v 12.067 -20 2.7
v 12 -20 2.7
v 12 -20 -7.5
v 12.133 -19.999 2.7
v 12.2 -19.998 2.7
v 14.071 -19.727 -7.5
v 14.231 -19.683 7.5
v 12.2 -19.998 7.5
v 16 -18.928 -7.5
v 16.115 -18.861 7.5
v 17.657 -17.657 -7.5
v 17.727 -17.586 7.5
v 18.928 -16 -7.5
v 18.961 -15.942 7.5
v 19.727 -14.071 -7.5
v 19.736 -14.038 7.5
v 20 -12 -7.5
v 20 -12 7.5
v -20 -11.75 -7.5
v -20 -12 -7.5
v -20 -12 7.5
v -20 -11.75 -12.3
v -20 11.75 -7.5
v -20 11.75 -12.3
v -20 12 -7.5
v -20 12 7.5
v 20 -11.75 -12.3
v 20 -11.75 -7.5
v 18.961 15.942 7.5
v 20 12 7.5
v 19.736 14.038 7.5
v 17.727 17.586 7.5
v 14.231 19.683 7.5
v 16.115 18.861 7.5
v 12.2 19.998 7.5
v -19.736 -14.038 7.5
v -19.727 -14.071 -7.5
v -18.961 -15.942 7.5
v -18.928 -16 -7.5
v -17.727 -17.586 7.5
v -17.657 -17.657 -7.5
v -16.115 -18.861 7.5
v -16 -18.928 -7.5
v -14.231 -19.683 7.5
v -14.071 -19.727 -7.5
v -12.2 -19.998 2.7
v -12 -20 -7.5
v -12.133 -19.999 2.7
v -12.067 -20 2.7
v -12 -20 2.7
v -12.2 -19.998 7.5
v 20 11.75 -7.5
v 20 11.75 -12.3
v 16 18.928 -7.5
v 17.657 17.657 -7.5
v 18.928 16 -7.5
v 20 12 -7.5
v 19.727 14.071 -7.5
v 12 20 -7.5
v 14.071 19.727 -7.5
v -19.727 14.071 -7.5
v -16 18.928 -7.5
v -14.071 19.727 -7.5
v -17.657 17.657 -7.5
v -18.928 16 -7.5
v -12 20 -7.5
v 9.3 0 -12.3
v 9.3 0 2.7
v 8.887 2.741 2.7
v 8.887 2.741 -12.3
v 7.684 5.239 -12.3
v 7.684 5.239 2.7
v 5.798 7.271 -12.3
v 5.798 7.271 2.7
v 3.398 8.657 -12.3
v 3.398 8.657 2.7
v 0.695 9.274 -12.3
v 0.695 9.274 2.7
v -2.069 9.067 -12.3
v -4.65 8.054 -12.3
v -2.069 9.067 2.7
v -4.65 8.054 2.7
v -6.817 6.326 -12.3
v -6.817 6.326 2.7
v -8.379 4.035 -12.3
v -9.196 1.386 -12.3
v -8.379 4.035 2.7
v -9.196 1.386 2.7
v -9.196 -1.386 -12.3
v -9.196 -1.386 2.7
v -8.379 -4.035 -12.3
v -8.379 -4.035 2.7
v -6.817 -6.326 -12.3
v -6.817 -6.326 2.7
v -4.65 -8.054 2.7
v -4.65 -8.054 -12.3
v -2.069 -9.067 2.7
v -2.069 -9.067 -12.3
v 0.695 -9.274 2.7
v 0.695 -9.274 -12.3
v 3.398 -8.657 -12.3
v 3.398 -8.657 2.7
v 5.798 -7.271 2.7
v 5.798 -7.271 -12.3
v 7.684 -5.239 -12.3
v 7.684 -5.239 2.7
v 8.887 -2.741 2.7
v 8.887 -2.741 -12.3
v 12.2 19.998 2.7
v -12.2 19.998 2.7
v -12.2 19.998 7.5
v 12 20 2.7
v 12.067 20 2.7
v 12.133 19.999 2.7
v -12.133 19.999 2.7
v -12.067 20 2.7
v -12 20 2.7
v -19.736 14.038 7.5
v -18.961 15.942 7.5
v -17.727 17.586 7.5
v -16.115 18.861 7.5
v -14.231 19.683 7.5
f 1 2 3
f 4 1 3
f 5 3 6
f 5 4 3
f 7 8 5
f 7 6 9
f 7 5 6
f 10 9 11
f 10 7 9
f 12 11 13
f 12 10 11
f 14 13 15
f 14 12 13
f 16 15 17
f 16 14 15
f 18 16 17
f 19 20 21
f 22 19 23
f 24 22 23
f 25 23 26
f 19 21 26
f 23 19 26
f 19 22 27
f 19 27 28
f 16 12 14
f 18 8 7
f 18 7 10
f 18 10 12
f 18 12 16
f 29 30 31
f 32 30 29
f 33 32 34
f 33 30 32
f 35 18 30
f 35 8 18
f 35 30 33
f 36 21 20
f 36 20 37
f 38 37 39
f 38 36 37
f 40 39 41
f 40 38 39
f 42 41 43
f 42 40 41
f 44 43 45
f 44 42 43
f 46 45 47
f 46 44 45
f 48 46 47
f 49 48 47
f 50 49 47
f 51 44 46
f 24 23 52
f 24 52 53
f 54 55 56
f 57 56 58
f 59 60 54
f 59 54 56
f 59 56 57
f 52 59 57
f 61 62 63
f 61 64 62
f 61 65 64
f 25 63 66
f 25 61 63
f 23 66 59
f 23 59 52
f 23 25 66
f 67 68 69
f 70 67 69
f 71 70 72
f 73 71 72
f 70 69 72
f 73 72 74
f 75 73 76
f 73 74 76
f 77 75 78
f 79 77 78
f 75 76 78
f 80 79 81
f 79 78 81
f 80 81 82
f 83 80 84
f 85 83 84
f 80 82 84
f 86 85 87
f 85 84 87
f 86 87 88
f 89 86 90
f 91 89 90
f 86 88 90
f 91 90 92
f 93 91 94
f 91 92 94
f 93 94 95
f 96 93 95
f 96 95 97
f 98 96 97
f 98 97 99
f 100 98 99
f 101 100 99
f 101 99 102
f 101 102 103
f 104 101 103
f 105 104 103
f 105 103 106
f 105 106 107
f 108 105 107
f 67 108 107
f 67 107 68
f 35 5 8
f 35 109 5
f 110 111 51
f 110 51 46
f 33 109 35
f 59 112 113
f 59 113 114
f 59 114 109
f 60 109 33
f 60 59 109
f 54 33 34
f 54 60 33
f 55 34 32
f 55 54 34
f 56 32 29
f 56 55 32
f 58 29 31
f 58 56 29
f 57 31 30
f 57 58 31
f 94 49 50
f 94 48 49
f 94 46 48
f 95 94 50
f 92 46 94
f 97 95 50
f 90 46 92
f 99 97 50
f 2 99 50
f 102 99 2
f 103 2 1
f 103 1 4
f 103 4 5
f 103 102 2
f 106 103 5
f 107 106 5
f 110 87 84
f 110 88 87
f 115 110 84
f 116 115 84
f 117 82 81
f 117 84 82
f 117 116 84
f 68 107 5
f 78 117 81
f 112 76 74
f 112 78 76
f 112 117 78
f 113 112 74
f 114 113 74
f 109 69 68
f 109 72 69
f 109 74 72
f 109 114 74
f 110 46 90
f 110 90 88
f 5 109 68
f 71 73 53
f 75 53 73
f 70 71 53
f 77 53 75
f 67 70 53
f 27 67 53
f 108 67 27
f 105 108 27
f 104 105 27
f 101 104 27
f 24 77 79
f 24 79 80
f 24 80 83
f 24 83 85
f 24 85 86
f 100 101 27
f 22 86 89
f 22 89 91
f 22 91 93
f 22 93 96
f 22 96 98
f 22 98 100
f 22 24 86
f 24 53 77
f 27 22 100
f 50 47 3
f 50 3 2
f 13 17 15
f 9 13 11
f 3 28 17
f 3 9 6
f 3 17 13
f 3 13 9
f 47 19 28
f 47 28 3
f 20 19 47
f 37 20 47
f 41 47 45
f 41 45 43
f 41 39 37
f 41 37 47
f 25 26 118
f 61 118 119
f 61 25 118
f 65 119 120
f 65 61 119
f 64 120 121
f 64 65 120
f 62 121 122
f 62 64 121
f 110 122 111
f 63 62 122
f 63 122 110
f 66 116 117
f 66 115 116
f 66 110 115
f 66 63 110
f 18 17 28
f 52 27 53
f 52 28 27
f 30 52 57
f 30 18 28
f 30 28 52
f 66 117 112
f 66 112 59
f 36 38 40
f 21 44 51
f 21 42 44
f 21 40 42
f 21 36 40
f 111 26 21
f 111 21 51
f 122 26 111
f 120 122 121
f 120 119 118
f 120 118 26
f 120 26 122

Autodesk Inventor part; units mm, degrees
ref_plane "YZ Plane" through (0, 0, 0) normal (1, 0, 0) x (0, 1, 0)
ref_plane "XZ Plane" through (0, 0, 0) normal (0, 1, 0) x (-1, 0, 0)
ref_plane "XY Plane" through (0, 0, 0) normal (0, 0, 1) x (1, 0, 0)
sketch "Sketch1" plane through (0, 0, 0) normal (1, 0, 0) x (0, 1, 0)
  line L0 (-20, 7.5) -> (20, 7.5)
  line L1 (20, 7.5) -> (20, -7.5)
  line L2 (20, -7.5) -> (11.75, -7.5)
  line L3 (11.75, -7.5) -> (11.75, -12.3)
  line L4 (11.75, -12.3) -> (-11.75, -12.3)
  line L5 (-11.75, -12.3) -> (-11.75, -7.5)
  line L6 (-11.75, -7.5) -> (-20, -7.5)
  line L7 (-20, -7.5) -> (-20, 7.5)
  point P0 (0, 0)
  point P1 (0, 7.5)
  point P2 (20, 0)
  point P3 (0, -12.3)
  dimension "d0" = 15
  dimension "d1" = 40
  dimension "d2" = 4.8
  dimension "d3" = 23.5
extrude "Extrusion1" add sketch "Sketch1" along normal mid plane 40
sketch "Sketch2" plane through (-20, 20, 7.5) normal (0, 1, 0) x (1, 0, 0)
  line L0 (32.2, 0) -> (7.8, 0)
  line L1 (7.8, 0) -> (7.8, 4.8)
  line L2 (7.8, 4.8) -> (32.2, 4.8)
  line L3 (32.2, 4.8) -> (32.2, 0)
  point P0 (20, 7.5)
  point P1 (40, 0)
  point P2 (20, 4.8)
  dimension "d6" = 24.4
  dimension "d7" = 4.8
extrude "Extrusion2" cut sketch "Sketch2" against normal up to next
fillet "Fillet1" radius 8 4 edges at (20, 20, 0) (-20, 20, 0) (-20, -20, 0) (20, -20, 0)
sketch "Sketch3" plane through (-12, 20, 2.7) normal (0, 0, 1) x (1, 0, 0)
  circle A0 centre (12, -20) radius 9.3
  dimension "d11" = 18.6
extrude "Extrusion3" cut sketch "Sketch3" against normal up to next
properties part number "OldhamCouplerMiddle"
